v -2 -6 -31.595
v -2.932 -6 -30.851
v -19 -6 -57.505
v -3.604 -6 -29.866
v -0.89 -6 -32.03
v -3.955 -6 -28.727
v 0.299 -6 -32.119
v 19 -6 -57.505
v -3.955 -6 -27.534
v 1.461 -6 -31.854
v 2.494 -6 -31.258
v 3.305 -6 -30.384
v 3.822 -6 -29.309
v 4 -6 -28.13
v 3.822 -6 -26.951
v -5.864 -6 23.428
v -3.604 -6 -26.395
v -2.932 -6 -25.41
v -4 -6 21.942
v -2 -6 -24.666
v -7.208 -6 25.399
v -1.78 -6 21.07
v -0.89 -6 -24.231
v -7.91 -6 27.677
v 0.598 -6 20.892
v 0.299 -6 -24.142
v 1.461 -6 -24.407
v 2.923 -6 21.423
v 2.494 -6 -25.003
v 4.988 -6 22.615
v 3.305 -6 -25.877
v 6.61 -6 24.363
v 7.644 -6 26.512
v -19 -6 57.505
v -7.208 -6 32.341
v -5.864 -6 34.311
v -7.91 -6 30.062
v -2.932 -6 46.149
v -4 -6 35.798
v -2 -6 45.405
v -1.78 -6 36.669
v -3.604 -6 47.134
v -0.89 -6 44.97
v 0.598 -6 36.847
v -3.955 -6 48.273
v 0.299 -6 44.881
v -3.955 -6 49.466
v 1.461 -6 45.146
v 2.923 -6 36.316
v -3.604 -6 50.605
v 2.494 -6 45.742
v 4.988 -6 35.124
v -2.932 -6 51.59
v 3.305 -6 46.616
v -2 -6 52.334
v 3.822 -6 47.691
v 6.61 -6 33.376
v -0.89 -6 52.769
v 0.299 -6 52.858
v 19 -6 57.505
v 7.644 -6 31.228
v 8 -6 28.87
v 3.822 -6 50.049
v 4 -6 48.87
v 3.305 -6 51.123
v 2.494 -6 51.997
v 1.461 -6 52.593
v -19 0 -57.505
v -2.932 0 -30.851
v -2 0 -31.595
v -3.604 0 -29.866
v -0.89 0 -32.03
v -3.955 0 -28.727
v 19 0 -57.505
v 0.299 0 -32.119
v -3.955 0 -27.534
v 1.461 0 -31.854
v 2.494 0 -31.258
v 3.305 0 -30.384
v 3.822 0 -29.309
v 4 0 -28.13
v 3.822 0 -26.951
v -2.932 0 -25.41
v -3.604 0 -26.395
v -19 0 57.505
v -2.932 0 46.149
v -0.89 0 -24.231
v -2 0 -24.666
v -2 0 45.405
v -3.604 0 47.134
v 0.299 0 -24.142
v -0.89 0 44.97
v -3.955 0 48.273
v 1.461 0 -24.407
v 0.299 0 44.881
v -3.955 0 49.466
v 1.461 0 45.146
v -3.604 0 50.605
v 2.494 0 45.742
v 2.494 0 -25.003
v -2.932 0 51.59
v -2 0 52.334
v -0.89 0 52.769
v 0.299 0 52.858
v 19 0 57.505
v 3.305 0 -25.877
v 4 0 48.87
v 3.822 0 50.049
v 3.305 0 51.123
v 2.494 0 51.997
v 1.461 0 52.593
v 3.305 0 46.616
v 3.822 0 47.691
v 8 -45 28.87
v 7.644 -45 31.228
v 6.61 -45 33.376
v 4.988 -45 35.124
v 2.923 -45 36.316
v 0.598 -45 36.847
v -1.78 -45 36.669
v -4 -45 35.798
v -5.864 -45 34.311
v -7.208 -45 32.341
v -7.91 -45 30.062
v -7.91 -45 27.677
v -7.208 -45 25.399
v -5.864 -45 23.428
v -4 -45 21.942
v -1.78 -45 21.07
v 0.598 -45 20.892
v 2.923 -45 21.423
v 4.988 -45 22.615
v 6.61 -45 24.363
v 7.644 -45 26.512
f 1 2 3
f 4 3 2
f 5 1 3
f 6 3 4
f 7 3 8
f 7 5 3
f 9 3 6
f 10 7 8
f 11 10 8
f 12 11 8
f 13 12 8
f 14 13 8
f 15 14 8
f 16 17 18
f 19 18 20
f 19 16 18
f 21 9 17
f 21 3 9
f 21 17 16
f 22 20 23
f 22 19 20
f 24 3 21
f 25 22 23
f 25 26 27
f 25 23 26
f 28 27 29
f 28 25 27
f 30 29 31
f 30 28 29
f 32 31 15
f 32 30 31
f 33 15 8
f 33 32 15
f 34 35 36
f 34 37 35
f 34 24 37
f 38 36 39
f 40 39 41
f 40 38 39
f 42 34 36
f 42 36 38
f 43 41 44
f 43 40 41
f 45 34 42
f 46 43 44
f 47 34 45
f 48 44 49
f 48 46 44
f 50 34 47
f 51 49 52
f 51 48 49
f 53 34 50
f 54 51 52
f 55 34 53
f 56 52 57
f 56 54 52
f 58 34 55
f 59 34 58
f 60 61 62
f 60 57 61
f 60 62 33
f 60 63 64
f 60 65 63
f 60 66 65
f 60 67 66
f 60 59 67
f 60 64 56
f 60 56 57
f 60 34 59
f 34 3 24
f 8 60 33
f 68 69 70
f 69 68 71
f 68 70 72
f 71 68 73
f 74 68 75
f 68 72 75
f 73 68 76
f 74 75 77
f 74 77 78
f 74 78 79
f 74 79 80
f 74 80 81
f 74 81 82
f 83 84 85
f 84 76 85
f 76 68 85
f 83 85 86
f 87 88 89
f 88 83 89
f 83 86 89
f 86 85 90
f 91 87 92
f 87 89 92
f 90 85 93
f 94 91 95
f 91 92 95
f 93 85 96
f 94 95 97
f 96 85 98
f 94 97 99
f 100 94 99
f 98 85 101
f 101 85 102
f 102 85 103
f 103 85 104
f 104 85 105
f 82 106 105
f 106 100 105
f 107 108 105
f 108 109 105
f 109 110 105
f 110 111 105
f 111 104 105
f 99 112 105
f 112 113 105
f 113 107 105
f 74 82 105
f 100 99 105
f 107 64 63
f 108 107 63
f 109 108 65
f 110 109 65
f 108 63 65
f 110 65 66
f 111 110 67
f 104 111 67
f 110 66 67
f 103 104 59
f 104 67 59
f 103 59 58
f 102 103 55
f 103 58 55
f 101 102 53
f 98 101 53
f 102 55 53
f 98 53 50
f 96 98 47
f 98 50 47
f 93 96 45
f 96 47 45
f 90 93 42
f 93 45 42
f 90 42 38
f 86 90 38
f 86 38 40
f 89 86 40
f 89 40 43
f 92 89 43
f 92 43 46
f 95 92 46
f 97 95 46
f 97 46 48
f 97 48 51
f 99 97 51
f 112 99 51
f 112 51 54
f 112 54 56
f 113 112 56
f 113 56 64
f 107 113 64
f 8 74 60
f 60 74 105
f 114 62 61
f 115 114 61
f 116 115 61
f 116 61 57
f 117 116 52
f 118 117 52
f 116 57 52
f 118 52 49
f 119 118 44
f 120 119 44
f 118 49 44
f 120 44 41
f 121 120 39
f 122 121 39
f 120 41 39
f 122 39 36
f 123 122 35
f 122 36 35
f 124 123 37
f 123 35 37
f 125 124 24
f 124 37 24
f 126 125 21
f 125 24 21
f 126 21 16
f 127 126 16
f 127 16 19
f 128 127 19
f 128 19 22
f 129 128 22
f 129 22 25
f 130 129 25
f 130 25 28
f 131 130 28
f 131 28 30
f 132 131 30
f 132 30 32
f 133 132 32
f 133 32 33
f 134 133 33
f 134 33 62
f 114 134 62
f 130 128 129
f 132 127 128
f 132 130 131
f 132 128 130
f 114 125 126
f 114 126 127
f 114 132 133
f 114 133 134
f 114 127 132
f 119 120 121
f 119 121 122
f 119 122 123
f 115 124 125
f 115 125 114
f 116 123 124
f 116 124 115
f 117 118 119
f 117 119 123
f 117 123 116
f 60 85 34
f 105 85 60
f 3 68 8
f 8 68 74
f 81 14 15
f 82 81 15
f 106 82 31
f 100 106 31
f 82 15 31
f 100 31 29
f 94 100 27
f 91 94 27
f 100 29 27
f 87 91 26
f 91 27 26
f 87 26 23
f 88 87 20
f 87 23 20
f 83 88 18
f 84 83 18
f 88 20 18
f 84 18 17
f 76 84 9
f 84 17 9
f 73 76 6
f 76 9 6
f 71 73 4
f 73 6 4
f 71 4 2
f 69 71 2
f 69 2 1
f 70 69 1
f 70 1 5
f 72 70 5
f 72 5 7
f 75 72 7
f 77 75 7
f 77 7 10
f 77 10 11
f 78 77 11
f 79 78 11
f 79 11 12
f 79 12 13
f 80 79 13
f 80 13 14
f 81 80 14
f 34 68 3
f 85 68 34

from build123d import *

# Parameters (mm, degrees)
F0_W     = 37.999924
F0_H     = 115.010692
F0_R     = 7.99973
F1_DEPTH = 6
F2_DEPTH = 45
F3_R     = 4
F4_DEPTH = 6.001


with BuildPart() as f1:
    # F0 (on Front) → F1 (new body)
    with BuildSketch(Plane.XZ):
        Rectangle(F0_W, F0_H)
        with Locations((0, 28.869588)):
            Circle(F0_R, mode=Mode.SUBTRACT)
    extrude(amount=F1_DEPTH)

    # F0 (on Front) → F2 (join)
    with BuildSketch(Plane.XZ):
        with Locations((0, 28.869588)):
            Circle(F0_R)
    extrude(amount=F2_DEPTH)

    # F3 (on face) → F4 (cut, through all)
    with BuildSketch(Plane.XZ.offset(6)):
        with Locations((0, 48.869588)):
            Circle(F3_R)
        with Locations((0, -28.130412)):
            Circle(F3_R)
    extrude(amount=-F4_DEPTH, mode=Mode.SUBTRACT)


solid = f1.part
